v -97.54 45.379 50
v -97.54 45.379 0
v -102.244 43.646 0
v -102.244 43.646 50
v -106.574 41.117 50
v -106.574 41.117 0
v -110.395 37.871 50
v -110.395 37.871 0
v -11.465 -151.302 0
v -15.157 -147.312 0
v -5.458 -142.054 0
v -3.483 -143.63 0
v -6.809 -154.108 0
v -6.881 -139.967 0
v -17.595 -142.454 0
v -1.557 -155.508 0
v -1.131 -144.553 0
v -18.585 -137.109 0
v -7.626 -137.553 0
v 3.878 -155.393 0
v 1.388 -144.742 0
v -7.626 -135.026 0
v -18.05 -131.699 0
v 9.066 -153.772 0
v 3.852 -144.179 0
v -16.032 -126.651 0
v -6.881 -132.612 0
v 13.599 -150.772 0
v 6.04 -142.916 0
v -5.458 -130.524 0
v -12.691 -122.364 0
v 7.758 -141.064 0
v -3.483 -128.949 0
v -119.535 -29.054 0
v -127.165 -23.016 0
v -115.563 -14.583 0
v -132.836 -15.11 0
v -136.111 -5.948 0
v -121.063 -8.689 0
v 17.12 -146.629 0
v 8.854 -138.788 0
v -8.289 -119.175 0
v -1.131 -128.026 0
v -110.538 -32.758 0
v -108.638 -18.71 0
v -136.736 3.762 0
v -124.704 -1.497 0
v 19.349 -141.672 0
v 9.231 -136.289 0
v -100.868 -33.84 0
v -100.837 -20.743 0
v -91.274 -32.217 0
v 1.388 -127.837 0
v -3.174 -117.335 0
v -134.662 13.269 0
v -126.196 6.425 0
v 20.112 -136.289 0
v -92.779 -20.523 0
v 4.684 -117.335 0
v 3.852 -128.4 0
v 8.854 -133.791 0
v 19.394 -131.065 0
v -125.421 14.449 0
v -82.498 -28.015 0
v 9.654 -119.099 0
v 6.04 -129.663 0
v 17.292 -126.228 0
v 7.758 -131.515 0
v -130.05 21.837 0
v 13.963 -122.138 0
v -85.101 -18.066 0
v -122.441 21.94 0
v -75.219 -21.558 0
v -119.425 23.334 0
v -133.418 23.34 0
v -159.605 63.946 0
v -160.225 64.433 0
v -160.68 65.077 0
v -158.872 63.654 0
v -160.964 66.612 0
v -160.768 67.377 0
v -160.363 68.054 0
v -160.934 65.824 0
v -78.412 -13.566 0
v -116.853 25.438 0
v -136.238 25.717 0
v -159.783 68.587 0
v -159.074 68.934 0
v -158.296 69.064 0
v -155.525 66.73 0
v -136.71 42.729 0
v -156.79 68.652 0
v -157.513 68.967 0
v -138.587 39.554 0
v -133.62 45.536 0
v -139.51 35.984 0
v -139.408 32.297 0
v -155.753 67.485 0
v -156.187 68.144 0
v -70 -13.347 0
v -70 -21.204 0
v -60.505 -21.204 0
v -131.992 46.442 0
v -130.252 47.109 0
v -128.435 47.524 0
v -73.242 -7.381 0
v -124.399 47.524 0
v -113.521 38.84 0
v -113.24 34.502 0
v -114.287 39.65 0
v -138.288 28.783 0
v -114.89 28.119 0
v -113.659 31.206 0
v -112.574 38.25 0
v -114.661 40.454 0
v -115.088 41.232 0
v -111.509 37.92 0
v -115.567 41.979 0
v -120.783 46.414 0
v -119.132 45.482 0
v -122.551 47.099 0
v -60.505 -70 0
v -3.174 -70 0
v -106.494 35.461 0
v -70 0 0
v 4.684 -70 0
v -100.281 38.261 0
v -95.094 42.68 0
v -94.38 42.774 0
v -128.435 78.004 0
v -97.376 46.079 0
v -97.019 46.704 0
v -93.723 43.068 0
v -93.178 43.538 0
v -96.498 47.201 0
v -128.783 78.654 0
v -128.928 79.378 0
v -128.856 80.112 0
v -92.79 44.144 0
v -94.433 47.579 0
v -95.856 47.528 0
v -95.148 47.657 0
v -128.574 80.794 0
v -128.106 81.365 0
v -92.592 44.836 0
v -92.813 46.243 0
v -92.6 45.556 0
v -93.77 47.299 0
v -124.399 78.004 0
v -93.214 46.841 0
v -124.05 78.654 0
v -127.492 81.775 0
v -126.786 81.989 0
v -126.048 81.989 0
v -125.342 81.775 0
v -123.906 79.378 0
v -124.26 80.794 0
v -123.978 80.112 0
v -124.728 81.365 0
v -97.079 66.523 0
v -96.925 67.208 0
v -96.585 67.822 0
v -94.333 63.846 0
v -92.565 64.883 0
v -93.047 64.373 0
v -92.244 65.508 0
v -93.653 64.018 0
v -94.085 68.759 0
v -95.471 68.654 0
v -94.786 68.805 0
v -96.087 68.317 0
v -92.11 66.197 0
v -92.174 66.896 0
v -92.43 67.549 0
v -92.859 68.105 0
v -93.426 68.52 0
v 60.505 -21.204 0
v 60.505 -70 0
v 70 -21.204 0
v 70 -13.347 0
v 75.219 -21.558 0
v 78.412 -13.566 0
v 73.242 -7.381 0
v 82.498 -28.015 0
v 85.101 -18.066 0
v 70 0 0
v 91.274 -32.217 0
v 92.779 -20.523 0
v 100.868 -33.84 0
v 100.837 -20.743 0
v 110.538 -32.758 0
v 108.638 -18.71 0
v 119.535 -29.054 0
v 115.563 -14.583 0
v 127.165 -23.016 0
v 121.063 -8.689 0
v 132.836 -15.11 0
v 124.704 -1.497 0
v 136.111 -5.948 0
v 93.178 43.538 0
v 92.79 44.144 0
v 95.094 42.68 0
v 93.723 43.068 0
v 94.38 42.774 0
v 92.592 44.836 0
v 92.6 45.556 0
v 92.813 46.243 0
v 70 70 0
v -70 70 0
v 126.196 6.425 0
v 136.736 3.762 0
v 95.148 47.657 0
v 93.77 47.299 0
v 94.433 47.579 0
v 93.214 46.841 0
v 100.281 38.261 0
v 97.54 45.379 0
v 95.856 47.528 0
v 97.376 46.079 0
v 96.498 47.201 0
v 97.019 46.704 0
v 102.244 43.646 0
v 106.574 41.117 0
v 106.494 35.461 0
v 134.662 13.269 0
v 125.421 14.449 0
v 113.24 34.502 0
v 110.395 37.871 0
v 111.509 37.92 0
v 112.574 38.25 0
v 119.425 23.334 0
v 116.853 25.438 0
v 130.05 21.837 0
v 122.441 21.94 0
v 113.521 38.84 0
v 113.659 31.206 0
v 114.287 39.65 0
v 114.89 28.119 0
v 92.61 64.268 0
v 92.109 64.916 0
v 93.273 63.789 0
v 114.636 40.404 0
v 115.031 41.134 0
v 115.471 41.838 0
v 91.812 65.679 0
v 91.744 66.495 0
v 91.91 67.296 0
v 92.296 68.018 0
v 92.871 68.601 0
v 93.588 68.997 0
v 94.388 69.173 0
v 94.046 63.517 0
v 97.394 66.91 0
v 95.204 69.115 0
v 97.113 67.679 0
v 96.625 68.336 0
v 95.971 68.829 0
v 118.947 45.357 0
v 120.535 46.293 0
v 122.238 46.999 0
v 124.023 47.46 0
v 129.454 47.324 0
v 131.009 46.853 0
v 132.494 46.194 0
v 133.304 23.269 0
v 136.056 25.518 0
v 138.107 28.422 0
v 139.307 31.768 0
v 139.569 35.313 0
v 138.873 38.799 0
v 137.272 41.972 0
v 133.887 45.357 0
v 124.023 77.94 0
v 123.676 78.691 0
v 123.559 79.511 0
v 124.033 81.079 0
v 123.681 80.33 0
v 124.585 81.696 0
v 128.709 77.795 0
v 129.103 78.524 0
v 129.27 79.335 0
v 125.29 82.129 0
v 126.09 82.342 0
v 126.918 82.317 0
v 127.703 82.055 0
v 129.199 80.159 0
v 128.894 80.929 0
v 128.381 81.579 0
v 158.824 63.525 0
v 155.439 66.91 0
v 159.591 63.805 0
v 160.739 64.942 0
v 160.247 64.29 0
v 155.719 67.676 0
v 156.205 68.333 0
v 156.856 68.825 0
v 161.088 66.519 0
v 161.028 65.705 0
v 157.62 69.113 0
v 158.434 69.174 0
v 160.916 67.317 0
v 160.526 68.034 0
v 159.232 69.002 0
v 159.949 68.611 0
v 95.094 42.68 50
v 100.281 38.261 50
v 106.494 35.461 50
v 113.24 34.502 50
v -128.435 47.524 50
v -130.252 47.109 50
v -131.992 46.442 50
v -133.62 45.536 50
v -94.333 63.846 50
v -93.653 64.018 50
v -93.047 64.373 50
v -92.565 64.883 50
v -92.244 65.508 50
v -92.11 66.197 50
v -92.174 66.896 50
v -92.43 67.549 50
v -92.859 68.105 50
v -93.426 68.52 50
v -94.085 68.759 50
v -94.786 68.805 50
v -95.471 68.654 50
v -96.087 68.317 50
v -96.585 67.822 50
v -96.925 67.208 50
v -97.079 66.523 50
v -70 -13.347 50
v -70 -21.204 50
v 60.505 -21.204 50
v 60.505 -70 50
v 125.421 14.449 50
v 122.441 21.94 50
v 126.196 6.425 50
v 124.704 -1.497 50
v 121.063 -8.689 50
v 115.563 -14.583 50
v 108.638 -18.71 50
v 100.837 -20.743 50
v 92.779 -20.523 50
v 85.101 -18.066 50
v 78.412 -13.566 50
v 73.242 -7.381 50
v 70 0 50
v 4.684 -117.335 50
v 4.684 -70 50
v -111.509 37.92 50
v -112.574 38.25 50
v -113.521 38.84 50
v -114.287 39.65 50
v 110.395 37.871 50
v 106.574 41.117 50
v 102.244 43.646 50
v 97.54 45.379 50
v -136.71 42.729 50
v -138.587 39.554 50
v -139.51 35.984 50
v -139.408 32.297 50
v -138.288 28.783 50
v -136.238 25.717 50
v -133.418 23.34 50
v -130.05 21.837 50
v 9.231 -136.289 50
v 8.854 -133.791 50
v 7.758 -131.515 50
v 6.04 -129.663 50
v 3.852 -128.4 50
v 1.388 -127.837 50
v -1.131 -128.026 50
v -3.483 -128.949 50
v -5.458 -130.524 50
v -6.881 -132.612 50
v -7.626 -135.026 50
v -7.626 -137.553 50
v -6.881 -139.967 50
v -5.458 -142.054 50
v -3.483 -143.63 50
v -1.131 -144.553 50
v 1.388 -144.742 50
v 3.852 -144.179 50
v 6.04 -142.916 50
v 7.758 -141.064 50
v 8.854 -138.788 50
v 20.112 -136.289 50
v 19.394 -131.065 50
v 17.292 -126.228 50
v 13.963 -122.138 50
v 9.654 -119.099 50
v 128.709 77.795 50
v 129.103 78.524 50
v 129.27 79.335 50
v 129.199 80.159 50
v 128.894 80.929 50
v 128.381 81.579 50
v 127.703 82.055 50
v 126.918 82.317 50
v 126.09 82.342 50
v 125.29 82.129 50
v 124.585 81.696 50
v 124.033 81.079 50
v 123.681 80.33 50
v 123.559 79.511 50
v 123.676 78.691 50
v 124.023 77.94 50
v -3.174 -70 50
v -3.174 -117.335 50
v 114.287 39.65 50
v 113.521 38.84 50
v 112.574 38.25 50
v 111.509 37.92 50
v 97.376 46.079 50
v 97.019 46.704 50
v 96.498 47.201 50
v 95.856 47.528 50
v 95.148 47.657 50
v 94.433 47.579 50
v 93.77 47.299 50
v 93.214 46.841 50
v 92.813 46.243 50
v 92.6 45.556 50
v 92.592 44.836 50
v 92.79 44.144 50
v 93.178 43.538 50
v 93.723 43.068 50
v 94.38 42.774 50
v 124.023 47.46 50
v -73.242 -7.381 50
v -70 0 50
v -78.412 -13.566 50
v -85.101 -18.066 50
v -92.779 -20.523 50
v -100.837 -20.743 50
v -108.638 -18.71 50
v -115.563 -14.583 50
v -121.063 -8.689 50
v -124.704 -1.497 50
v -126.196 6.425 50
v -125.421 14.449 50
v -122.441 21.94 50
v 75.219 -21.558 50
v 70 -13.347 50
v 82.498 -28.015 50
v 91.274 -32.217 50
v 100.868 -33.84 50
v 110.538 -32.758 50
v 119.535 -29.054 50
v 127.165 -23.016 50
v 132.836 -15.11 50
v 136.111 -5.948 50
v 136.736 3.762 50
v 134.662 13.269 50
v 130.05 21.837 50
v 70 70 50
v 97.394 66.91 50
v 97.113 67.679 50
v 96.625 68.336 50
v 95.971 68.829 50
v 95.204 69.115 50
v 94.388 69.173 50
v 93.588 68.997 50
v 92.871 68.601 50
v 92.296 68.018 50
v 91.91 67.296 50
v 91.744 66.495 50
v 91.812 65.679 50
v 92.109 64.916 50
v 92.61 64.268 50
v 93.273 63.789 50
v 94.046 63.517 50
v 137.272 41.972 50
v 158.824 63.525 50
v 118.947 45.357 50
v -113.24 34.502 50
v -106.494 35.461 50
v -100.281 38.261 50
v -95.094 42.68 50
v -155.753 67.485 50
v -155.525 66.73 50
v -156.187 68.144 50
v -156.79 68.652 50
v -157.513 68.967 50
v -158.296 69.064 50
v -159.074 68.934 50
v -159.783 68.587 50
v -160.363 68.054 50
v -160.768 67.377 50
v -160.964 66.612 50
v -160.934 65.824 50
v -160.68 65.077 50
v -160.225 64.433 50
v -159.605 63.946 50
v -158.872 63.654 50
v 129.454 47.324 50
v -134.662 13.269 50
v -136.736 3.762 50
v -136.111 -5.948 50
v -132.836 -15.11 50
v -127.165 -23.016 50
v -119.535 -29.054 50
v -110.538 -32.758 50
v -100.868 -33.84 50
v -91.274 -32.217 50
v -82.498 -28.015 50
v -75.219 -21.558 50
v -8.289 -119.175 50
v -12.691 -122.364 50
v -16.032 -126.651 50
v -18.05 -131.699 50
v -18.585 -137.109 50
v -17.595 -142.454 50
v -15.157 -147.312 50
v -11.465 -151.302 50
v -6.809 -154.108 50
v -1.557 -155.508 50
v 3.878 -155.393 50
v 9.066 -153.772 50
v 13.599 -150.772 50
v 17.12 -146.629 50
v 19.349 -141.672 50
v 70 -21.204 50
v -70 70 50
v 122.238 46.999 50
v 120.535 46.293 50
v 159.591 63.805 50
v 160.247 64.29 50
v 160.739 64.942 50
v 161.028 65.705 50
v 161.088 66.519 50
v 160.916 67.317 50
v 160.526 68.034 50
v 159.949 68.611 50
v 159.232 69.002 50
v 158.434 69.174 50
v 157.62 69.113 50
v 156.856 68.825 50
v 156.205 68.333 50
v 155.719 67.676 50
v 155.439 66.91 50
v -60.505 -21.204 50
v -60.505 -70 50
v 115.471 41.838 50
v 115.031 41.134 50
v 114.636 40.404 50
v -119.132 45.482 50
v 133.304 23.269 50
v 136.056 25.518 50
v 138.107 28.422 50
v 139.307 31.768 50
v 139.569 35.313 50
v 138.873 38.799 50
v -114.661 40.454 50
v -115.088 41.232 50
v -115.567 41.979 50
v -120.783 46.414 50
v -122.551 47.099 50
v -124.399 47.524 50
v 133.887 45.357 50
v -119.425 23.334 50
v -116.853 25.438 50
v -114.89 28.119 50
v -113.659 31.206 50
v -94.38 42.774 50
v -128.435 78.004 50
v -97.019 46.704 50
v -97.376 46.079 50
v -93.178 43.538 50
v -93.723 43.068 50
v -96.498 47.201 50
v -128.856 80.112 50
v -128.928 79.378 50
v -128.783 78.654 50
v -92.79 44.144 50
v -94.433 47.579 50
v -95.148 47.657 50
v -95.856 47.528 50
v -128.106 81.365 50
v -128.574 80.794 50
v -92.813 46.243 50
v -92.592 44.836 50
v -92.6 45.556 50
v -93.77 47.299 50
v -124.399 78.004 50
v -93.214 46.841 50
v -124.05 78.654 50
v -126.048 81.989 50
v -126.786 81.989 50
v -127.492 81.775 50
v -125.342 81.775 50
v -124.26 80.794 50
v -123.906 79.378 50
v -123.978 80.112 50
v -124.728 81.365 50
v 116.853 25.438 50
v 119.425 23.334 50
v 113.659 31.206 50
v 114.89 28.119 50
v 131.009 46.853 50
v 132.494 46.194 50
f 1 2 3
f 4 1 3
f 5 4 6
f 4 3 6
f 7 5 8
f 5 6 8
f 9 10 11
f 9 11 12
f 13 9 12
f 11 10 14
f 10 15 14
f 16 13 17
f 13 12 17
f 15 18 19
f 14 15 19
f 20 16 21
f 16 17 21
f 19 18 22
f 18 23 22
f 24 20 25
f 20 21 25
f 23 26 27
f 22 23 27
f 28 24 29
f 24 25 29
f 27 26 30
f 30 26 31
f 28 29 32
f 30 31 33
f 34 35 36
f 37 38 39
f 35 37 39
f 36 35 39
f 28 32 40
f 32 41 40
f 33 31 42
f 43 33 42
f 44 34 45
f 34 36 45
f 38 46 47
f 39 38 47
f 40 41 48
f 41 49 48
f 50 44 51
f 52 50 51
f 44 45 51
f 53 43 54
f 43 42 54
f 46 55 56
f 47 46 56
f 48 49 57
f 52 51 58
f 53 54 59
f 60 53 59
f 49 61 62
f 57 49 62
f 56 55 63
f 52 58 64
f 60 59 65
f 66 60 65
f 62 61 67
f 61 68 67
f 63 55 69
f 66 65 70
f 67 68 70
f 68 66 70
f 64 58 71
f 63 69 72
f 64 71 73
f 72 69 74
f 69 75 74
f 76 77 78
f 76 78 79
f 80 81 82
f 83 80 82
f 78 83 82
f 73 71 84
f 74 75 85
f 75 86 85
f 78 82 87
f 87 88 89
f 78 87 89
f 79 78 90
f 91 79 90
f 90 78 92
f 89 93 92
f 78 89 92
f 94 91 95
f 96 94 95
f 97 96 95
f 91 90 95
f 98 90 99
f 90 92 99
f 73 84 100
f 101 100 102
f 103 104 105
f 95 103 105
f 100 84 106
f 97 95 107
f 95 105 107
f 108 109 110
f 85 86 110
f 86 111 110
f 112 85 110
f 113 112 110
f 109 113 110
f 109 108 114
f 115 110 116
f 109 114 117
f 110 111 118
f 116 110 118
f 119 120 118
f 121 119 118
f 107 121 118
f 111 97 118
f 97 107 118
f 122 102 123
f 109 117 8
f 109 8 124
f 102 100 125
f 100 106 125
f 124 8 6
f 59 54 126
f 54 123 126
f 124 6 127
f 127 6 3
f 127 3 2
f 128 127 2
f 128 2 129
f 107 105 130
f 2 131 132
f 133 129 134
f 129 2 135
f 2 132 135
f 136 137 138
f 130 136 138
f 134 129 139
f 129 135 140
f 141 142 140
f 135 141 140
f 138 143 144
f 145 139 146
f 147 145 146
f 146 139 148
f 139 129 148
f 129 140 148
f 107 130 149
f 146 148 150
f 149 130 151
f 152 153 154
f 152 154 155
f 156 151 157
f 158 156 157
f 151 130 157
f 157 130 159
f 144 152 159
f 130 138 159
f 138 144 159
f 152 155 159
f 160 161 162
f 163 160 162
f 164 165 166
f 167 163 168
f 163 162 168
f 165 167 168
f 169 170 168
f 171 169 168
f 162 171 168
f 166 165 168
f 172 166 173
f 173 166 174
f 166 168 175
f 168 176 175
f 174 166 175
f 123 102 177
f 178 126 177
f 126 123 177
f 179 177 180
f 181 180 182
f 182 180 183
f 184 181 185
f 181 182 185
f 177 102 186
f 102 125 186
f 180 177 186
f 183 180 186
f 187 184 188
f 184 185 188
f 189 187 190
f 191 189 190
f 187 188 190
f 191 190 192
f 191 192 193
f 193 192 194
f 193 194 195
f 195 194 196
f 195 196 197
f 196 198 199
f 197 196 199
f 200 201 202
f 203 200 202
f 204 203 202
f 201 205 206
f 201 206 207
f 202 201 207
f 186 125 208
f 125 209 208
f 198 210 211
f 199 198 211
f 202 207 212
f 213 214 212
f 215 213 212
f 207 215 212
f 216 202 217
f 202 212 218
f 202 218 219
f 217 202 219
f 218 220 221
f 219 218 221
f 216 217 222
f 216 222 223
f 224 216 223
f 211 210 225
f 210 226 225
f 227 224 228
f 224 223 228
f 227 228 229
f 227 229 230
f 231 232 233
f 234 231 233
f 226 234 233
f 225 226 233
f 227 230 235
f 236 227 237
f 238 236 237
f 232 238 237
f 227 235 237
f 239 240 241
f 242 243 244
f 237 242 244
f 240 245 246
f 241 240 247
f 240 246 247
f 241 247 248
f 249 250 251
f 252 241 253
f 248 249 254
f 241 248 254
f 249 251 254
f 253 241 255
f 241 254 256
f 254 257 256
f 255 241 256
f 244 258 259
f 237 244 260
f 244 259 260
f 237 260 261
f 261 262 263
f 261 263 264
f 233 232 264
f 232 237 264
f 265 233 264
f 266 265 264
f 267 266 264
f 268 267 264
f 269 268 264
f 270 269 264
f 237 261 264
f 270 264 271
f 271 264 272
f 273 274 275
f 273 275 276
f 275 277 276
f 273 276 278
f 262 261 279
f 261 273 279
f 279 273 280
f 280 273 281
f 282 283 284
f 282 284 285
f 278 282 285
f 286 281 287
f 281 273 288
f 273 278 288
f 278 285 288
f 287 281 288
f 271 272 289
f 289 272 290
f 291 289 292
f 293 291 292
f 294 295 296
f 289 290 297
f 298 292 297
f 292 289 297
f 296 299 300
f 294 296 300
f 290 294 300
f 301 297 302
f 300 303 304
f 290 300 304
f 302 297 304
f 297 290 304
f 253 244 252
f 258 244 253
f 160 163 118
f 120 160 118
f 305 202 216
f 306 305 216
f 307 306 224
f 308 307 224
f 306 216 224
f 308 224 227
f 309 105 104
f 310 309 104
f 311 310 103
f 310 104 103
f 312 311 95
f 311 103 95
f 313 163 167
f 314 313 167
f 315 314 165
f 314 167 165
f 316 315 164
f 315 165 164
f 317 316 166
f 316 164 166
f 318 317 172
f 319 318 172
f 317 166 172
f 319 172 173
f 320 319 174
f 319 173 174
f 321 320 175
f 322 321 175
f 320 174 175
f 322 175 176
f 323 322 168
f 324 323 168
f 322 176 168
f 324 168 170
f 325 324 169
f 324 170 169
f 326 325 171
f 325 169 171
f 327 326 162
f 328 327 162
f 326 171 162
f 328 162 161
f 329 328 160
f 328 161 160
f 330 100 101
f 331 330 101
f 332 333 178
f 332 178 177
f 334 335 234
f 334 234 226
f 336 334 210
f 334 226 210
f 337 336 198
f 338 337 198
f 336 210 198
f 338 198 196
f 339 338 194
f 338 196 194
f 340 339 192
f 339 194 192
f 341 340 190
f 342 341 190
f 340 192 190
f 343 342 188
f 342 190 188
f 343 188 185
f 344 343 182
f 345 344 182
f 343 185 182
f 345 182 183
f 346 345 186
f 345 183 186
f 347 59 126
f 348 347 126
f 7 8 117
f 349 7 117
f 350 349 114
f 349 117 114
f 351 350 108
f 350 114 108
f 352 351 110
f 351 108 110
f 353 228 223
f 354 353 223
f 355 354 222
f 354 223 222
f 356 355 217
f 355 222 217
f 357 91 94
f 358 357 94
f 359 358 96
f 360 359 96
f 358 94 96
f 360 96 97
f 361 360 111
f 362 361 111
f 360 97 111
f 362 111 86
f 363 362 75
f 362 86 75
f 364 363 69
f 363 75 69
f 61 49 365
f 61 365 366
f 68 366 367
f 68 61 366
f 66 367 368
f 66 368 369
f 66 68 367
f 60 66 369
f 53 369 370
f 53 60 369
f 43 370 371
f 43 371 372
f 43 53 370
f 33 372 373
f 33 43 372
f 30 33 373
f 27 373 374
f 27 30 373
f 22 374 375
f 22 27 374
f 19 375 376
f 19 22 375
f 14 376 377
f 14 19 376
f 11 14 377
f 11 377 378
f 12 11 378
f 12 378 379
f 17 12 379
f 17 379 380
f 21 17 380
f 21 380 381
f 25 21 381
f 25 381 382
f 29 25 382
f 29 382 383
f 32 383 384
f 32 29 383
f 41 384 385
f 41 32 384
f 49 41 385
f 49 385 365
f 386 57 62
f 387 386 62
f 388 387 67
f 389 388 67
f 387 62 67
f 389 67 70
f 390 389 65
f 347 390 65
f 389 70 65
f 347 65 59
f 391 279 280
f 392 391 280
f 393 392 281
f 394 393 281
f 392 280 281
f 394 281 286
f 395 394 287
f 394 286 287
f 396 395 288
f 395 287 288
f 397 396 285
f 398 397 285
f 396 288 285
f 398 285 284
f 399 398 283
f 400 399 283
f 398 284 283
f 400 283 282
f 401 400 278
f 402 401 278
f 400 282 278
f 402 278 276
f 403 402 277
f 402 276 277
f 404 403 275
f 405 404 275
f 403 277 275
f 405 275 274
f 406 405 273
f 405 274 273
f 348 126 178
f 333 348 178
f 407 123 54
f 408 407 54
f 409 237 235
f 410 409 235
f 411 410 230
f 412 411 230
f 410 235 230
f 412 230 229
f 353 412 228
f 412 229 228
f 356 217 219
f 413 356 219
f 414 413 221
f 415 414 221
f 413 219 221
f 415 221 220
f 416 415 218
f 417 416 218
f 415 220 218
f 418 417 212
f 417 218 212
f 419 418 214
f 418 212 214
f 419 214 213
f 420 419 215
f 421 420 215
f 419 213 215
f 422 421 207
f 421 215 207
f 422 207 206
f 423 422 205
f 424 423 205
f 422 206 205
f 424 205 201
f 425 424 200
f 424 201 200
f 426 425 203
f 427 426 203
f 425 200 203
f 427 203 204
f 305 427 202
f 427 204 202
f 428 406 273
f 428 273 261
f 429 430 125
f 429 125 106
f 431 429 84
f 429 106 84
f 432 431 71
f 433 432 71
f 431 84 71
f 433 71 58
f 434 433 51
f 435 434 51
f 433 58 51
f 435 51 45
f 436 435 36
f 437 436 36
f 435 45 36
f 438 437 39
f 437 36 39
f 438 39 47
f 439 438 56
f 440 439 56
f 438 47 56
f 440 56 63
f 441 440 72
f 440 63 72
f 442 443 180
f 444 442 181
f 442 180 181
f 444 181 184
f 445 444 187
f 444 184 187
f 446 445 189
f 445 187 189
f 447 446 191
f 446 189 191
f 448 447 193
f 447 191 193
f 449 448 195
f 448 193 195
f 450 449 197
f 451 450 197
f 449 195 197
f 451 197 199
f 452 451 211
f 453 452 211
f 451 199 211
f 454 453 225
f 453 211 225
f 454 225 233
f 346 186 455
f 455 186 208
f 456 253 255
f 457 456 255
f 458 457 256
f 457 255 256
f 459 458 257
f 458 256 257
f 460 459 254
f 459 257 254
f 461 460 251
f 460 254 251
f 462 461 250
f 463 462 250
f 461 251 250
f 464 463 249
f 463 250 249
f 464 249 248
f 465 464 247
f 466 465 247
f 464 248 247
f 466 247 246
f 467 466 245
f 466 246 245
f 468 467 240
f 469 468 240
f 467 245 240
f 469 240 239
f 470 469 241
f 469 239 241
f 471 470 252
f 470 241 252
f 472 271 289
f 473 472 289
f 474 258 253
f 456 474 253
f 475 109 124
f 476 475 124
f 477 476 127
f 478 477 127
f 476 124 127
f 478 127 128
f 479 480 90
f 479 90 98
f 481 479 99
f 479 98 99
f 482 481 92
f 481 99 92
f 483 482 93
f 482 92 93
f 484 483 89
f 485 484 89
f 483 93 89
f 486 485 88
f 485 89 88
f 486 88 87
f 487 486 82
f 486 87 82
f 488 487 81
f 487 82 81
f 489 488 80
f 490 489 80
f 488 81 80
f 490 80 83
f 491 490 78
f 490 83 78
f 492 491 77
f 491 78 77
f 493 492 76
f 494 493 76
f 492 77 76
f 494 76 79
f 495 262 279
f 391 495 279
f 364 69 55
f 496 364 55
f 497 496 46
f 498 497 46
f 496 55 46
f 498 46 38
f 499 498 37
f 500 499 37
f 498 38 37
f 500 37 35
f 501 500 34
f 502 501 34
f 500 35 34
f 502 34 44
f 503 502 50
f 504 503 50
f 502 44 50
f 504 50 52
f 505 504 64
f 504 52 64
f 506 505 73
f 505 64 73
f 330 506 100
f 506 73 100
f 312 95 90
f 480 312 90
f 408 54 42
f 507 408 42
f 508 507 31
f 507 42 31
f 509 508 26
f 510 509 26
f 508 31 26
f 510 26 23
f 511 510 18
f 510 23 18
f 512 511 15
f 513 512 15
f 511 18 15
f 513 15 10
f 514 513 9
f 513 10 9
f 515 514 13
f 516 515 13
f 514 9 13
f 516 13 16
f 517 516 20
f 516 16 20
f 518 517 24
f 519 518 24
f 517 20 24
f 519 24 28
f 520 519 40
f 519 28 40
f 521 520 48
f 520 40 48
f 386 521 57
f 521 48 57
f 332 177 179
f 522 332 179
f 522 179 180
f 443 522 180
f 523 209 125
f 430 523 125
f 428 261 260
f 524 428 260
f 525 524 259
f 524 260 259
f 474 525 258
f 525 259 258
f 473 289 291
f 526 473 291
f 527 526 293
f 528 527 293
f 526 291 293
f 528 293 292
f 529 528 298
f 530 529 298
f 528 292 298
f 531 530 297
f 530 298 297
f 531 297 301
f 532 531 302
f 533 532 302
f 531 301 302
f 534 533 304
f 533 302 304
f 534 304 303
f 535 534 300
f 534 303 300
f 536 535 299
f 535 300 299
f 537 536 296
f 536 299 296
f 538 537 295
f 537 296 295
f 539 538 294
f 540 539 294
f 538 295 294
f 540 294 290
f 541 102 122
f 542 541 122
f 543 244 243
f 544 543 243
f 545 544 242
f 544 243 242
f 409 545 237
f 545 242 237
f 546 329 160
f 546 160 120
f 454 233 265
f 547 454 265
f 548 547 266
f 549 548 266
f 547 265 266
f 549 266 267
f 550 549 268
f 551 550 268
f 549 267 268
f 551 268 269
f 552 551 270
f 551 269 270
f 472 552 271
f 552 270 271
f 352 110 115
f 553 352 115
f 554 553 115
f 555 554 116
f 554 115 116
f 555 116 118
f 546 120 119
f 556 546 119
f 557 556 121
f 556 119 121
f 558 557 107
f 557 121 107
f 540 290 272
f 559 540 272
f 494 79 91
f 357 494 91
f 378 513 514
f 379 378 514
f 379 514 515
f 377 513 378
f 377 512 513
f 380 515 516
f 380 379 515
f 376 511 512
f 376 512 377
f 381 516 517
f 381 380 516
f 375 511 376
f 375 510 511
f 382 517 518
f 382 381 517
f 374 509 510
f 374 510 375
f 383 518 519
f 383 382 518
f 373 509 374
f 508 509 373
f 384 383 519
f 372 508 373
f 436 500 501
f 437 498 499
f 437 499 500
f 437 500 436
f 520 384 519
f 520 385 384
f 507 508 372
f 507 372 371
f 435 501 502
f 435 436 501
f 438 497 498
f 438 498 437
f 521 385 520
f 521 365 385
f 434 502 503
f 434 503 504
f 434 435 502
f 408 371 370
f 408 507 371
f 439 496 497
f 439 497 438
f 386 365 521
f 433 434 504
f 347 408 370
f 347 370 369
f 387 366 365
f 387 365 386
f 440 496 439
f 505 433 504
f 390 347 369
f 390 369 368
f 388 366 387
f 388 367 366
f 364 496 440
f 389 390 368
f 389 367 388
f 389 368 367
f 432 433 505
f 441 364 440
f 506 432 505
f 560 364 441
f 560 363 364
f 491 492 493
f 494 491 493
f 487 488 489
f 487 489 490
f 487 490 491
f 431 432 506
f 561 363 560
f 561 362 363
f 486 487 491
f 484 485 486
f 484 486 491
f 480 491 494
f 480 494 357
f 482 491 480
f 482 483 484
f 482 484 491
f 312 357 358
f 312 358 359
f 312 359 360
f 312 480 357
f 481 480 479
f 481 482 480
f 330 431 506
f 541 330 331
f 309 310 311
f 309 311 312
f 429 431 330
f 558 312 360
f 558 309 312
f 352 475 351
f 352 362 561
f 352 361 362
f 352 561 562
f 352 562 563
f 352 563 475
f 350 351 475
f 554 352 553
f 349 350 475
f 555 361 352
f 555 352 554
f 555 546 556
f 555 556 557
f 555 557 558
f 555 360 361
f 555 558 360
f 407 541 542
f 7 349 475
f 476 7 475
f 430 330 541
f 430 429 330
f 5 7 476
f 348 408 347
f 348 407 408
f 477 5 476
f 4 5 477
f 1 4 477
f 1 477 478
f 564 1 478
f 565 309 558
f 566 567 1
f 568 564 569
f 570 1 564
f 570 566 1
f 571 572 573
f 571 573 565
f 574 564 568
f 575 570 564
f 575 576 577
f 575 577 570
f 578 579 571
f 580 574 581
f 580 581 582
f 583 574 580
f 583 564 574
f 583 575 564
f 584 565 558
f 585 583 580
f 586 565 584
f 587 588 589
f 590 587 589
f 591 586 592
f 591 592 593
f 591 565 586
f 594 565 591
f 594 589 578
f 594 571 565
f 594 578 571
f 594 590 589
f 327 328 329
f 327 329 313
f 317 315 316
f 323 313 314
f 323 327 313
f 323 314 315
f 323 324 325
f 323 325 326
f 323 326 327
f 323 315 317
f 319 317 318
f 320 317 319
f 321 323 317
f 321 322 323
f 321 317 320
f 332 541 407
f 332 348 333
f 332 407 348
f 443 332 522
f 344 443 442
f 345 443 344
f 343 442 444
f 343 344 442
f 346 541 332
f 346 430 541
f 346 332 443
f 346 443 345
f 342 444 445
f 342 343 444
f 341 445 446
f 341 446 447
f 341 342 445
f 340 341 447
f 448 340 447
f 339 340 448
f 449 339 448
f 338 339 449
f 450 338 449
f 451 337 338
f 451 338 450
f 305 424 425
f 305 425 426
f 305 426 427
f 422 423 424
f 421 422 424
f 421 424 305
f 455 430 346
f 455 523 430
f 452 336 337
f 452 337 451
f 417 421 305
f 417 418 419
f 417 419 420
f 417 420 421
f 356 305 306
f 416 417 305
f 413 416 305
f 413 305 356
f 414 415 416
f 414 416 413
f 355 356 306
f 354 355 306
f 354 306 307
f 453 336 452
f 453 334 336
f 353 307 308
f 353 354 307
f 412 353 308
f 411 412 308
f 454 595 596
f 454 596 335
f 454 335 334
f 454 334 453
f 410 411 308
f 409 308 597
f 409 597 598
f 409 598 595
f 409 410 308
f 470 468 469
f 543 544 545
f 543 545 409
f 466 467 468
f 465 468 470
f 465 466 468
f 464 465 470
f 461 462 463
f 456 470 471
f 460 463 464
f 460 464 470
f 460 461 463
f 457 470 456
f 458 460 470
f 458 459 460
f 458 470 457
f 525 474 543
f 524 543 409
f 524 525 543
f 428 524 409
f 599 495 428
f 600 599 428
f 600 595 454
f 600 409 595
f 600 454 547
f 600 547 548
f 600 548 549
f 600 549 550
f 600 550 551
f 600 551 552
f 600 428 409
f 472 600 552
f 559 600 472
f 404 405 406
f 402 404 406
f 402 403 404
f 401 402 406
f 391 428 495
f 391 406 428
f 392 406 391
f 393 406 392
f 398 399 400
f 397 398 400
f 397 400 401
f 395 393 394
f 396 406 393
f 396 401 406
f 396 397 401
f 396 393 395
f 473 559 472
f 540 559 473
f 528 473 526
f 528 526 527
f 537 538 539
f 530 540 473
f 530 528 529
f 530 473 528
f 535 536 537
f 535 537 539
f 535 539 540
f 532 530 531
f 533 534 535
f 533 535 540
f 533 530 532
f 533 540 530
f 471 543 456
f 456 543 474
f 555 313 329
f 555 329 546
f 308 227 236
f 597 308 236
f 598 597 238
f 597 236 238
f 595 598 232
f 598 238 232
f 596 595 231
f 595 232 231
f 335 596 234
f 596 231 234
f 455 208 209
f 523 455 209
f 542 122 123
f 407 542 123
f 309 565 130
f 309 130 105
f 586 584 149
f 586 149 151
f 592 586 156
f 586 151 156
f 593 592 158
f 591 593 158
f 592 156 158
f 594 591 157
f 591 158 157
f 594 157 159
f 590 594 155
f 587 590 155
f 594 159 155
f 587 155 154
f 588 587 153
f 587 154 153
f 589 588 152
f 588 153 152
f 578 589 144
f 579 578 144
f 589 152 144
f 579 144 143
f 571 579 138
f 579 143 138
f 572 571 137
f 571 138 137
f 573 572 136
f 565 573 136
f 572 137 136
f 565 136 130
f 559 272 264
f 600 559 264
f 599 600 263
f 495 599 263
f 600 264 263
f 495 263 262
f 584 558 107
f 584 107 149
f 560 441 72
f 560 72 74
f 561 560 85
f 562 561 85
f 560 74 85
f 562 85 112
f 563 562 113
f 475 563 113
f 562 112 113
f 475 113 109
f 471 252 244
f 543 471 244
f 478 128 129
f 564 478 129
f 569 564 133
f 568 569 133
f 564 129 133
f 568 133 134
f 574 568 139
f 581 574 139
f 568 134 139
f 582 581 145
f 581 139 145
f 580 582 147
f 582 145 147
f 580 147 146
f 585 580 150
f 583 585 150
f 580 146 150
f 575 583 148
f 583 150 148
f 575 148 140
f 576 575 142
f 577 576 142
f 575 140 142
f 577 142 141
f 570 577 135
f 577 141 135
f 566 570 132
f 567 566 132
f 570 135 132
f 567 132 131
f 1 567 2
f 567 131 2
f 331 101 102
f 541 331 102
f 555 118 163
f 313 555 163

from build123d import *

# Parameters (mm, degrees)
F0_W     = 8.2024587318
F0_H     = 14.9754456007
F0_W_2   = 7.8511701431
F0_W_3   = 6.1057833955
F0_W_4   = 7.9714395106
F0_W_5   = 7.8018347267
F0_R     = 8.4758171695
F0_W_6   = 12.1613740921
F0_H_2   = 5.3091626614
F0_W_7   = 15.6213007867
F0_H_3   = 4.9807038158
F0_W_8   = 18.6961237341
F0_H_4   = 5.3202975541
F0_H_5   = 5.4446328431
F0_H_6   = 5.7703666389
F0_W_9   = 15.5081027187
F0_H_7   = 5.2070990205
F0_H_8   = 4.8675052822
F0_H_9   = 5.4084993899
F1_DEPTH = 50


with BuildPart() as f1:
    # F0 (on Top) → F1 (new body)
    with BuildSketch(Plane.XY):
        with BuildLine():
            ThreePointArc((-130.0504121954, 21.8366431133), (-119.5351660381, -29.0544007963), (-70, -13.3465658873))
            Line((-70, -13.3465658873), (-70, 0))
            ThreePointArc((-70, 0), (-108.6376082105, -18.7095534221), (-122.4410153952, 21.939900542))
            ThreePointArc((-122.4410153952, 21.939900542), (-115.7864607632, 26.7166574775), (-113.2402649142, 34.5023745845))
            ThreePointArc((-113.2402649142, 34.5023745845), (-113.504682577, 37.1288446093), (-114.2873233284, 39.649902908))
            ThreePointArc((-114.2873233284, 39.649902908), (-114.8682389509, 40.8468278409), (-115.5668931987, 41.9790709674))
            ThreePointArc((-115.5668931987, 41.9790709674), (-117.1816492611, 43.9009770114), (-119.131571718, 45.4817876878))
            ThreePointArc((-119.131571718, 45.4817876878), (-121.6544110929, 46.7882256944), (-124.398651027, 47.5235120068))
            ThreePointArc((-124.398651027, 47.5235120068), (-126.416883712, 47.6789933823), (-128.435116397, 47.5235120068))
            ThreePointArc((-128.435116397, 47.5235120068), (-131.1335313279, 46.8058910822), (-133.6201487451, 45.5357900033))
            ThreePointArc((-133.6201487451, 45.5357900033), (-135.2768725539, 44.2555218029), (-136.7098901894, 42.7289960416))
            ThreePointArc((-136.7098901894, 42.7289960416), (-138.9711537713, 30.5006766677), (-130.0504121954, 21.8366431133))
        make_face()
        Polygon((-60.5054162443, -21.2038177997), (-60.5054162443, -70), (-3.1736695673, -70), (4.6835821122, -70), (60.5054162443, -70), (60.5054162443, -21.2038177997), (70, -21.2038177997), (70, -13.3465658873), (70, 0), (70, 70), (-70, 70), (-70, 0), (-70, -13.3465658873), (-70, -21.2038177997), align=None)
        with BuildLine():
            ThreePointArc((-43.5259640217, -35.8406656981), (-42.5875064789, -55.7965331861), (-45.3945958096, -36.01680621))
            Line((-45.3945958096, -36.01680621), (-43.5259640217, -45.8406656981))
            Line((-43.5259640217, -45.8406656981), (-43.5259640217, -35.8406656981))
        make_face(mode=Mode.SUBTRACT)
        with BuildLine():
            ThreePointArc((-23.7259689531, -44.2763551831), (-3.9628669783, -47.186751296), (-23.9153972382, -46.2135393839))
            Line((-23.9153972382, -46.2135393839), (-13.9153972382, -46.2135393839))
            Line((-13.9153972382, -46.2135393839), (-23.7259689531, -44.2763551831))
        make_face(mode=Mode.SUBTRACT)
        with BuildLine():
            ThreePointArc((19.5891654442, -54.8887500712), (9.3177240714, -37.773142046), (21.6384869115, -53.4780886866))
            Line((21.6384869115, -53.4780886866), (14.9877956137, -46.0102707148))
            Line((14.9877956137, -46.0102707148), (19.5891654442, -54.8887500712))
        make_face(mode=Mode.SUBTRACT)
        with BuildLine():
            ThreePointArc((54.2939669435, -47.4309626042), (34.5934502284, -44.1615858906), (54.5334093753, -45.2557577961))
            Line((54.5334093753, -45.2557577961), (44.5334093753, -45.2557577961))
            Line((44.5334093753, -45.2557577961), (54.2939669435, -47.4309626042))
        make_face(mode=Mode.SUBTRACT)
        Polygon((-29.1168112308, 17.9860703647), (-47.8129349649, 17.9860703647), (-47.8129349649, 23.3945697546), (-47.8129349649, 28.7148673087), (-47.8129349649, 33.6955711246), (-47.8129349649, 39.1402039677), (-47.8129349649, 44.4493666291), (-47.8129349649, 49.6564656496), (-47.8129349649, 54.5239709318), (-47.8129349649, 60.2943375707), (-29.1168112308, 60.2943375707), (-10.7625117525, 60.2943375707), (4.5221573673, 60.2943375707), (20.0302600861, 60.2943375707), (35.6515608728, 60.2943375707), (47.8129349649, 60.2943375707), (47.8129349649, 54.5239709318), (47.8129349649, 49.6564656496), (47.8129349649, 44.4493666291), (47.8129349649, 39.1402039677), (47.8129349649, 33.6955711246), (47.8129349649, 28.7148673087), (47.8129349649, 23.3945697546), (47.8129349649, 17.9860703647), (35.6515608728, 17.9860703647), (20.0302600861, 17.9860703647), (4.5221573673, 17.9860703647), (-10.3591205552, 17.9860703647), align=None, mode=Mode.SUBTRACT)
        Polygon((-10.1461857557, -13.2323872645), (-18.1176252663, -13.2323872645), (-18.1176252663, 1.7430583362), (-10.1461857557, 1.7430583362), (-4.0404023603, 1.7430583362), (3.7614323664, 1.7430583362), (11.6126025096, 1.7430583362), (19.8150612414, 1.7430583362), (19.8150612414, -13.2323872645), (11.6126025096, -13.2323872645), (3.7614323664, -13.2323872645), (-4.0404023603, -13.2323872645), align=None, mode=Mode.SUBTRACT)
        with BuildLine():
            Line((70, 0), (70, -13.3465658873))
            ThreePointArc((70, -13.3465658873), (119.5351660381, -29.0544007963), (130.0504121954, 21.8366431133))
            ThreePointArc((130.0504121954, 21.8366431133), (138.8200130193, 30.0542664106), (137.2715918614, 41.9722202276))
            ThreePointArc((137.2715918614, 41.9722202276), (135.734160217, 43.8196510895), (133.8867293551, 45.3570827339))
            ThreePointArc((133.8867293551, 45.3570827339), (131.7614666088, 46.5464069906), (129.4536248278, 47.3242888853))
            ThreePointArc((129.4536248278, 47.3242888853), (126.7455827995, 47.674892941), (124.0234244804, 47.4597908334))
            ThreePointArc((124.0234244804, 47.4597908334), (121.3744087449, 46.6759824781), (118.9470358244, 45.3570811894))
            ThreePointArc((118.9470358244, 45.3570811894), (117.0424209259, 43.7621116442), (115.4710238, 41.8380022828))
            ThreePointArc((115.4710238, 41.8380022828), (114.8274186608, 40.7719505485), (114.2873233284, 39.649902908))
            ThreePointArc((114.2873233284, 39.649902908), (113.504682577, 37.1288446093), (113.2402649142, 34.5023745845))
            ThreePointArc((113.2402649142, 34.5023745845), (115.7864607632, 26.7166574775), (122.4410153952, 21.939900542))
            ThreePointArc((122.4410153952, 21.939900542), (108.6376082105, -18.7095534221), (70, 0))
        make_face()
        with BuildLine():
            ThreePointArc((95.0937389393, 42.679719094), (103.288313244, 36.6411293585), (113.2402649142, 34.5023745845))
            ThreePointArc((113.2402649142, 34.5023745845), (113.504682577, 37.1288446093), (114.2873233284, 39.649902908))
            ThreePointArc((114.2873233284, 39.649902908), (112.5739963411, 38.250429476), (110.3945353679, 37.8710021204))
            ThreePointArc((110.3945353679, 37.8710021204), (104.4646528089, 42.4765419774), (97.539836383, 45.3785106205))
            ThreePointArc((97.539836383, 45.3785106205), (93.2143177046, 46.8410933875), (95.0937389393, 42.679719094))
        make_face()
        with BuildLine():
            Line((94.0459784419, 63.5174356565), (115.4710238, 41.8380022828))
            ThreePointArc((115.4710238, 41.8380022828), (117.0424209259, 43.7621116442), (118.9470358244, 45.3570811894))
            Line((118.9470358244, 45.3570811894), (97.3944211338, 66.9096958799))
            ThreePointArc((97.3944211338, 66.9096958799), (92.5628075217, 68.330174272), (94.0459784419, 63.5174356565))
        make_face()
        with BuildLine():
            ThreePointArc((124.0234244804, 47.4597908334), (126.7455827995, 47.674892941), (129.4536248278, 47.3242888853))
            Line((129.4536248278, 47.3242888853), (128.7094544186, 77.7952030561))
            ThreePointArc((128.7094544186, 77.7952030561), (126.5050371575, 82.3593912177), (124.0234244804, 77.9397908334))
            Line((124.0234244804, 77.9397908334), (124.0234244804, 47.4597908334))
        make_face()
        with BuildLine():
            ThreePointArc((133.8867293551, 45.3570827339), (135.734160217, 43.8196510895), (137.2715918614, 41.9722202276))
            Line((137.2715918614, 41.9722202276), (158.824206552, 63.5248349182))
            ThreePointArc((158.824206552, 63.5248349182), (160.2578661303, 68.3433570028), (155.4393440457, 66.9096974245))
            Line((155.4393440457, 66.9096974245), (133.8867293551, 45.3570827339))
        make_face()
        with BuildLine():
            Line((-158.8719812907, 63.6543901362), (-136.7098901894, 42.7289960416))
            ThreePointArc((-136.7098901894, 42.7289960416), (-135.2768725539, 44.2555218029), (-133.6201487451, 45.5357900033))
            Line((-133.6201487451, 45.5357900033), (-155.5248616789, 66.7304579953))
            ThreePointArc((-155.5248616789, 66.7304579953), (-160.0923686659, 68.3413751972), (-158.8719812907, 63.6543901362))
        make_face()
        with BuildLine():
            Line((-128.435116397, 78.0035120068), (-128.435116397, 47.5235120068))
            ThreePointArc((-128.435116397, 47.5235120068), (-126.416883712, 47.6789933823), (-124.398651027, 47.5235120068))
            Line((-124.398651027, 47.5235120068), (-124.398651027, 78.0035120068))
            ThreePointArc((-124.398651027, 78.0035120068), (-126.416883712, 82.016306206), (-128.435116397, 78.0035120068))
        make_face()
        with BuildLine():
            ThreePointArc((-119.131571718, 45.4817876878), (-117.1816492611, 43.9009770114), (-115.5668931987, 41.9790709674))
            Line((-115.5668931987, 41.9790709674), (-94.333186417, 63.8459430874))
            ThreePointArc((-94.333186417, 63.8459430874), (-92.8588034867, 68.1053754047), (-97.0792408983, 66.5228215363))
            Line((-97.0792408983, 66.5228215363), (-119.131571718, 45.4817876878))
        make_face()
        with BuildLine():
            ThreePointArc((-114.2873233284, 39.649902908), (-113.504682577, 37.1288446093), (-113.2402649142, 34.5023745845))
            ThreePointArc((-113.2402649142, 34.5023745845), (-103.288313244, 36.6411293585), (-95.0937389393, 42.679719094))
            ThreePointArc((-95.0937389393, 42.679719094), (-93.2143177046, 46.8410933875), (-97.539836383, 45.3785106205))
            ThreePointArc((-97.539836383, 45.3785106205), (-104.4646528089, 42.4765419774), (-110.3945353679, 37.8710021204))
            ThreePointArc((-110.3945353679, 37.8710021204), (-112.5739963411, 38.250429476), (-114.2873233284, 39.649902908))
        make_face()
        with BuildLine():
            Line((-43.5259640217, -45.8406656981), (-45.3945958096, -36.01680621))
            ThreePointArc((-45.3945958096, -36.01680621), (-42.5875064789, -55.7965331861), (-43.5259640217, -35.8406656981))
            Line((-43.5259640217, -35.8406656981), (-43.5259640217, -45.8406656981))
        make_face()
        with BuildLine():
            Line((-13.9153972382, -46.2135393839), (-23.9153972382, -46.2135393839))
            ThreePointArc((-23.9153972382, -46.2135393839), (-3.9628669783, -47.186751296), (-23.7259689531, -44.2763551831))
            Line((-23.7259689531, -44.2763551831), (-13.9153972382, -46.2135393839))
        make_face()
        with BuildLine():
            Line((14.9877956137, -46.0102707148), (21.6384869115, -53.4780886866))
            ThreePointArc((21.6384869115, -53.4780886866), (9.3177240714, -37.773142046), (19.5891654442, -54.8887500712))
            Line((19.5891654442, -54.8887500712), (14.9877956137, -46.0102707148))
        make_face()
        with BuildLine():
            Line((44.5334093753, -45.2557577961), (54.5334093753, -45.2557577961))
            ThreePointArc((54.5334093753, -45.2557577961), (34.5934502284, -44.1615858906), (54.2939669435, -47.4309626042))
            Line((54.2939669435, -47.4309626042), (44.5334093753, -45.2557577961))
        make_face()
        with Locations((15.7138318755, -5.7446644641)):
            Rectangle(F0_W, F0_H)
        with Locations((7.687017438, -5.7446644641)):
            Rectangle(F0_W_2, F0_H)
        with Locations((-7.093294058, -5.7446644641)):
            Rectangle(F0_W_3, F0_H)
        with Locations((-14.131905511, -5.7446644641)):
            Rectangle(F0_W_4, F0_H)
        with Locations((-0.1394849969, -5.7446644641)):
            Rectangle(F0_W_5, F0_H)
        with BuildLine():
            Line((4.6835821122, -70), (-3.1736695673, -70))
            Line((-3.1736695673, -70), (-3.1736695673, -117.3349233655))
            ThreePointArc((-3.1736695673, -117.3349233655), (0.7549562724, -116.9320700406), (4.6835821122, -117.3349233655))
            Line((4.6835821122, -117.3349233655), (4.6835821122, -70))
        make_face()
        with BuildLine():
            ThreePointArc((4.6835821122, -117.3349233655), (0.7549562724, -116.9320700406), (-3.1736695673, -117.3349233655))
            ThreePointArc((-3.1736695673, -117.3349233655), (-11.4651338896, -151.3020925139), (20.1123635802, -136.2894773483))
            ThreePointArc((20.1123635802, -136.2894773483), (15.767571438, -124.0693871863), (4.6835821122, -117.3349233655))
        make_face()
        with Locations((0.7549562724, -136.2894773483)):
            Circle(F0_R, mode=Mode.SUBTRACT)
        with Locations((41.7322479188, 41.7947852984)):
            Rectangle(F0_W_6, F0_H_2)
        with Locations((27.8409104794, 31.2052192166)):
            Rectangle(F0_W_7, F0_H_3)
        with Locations((-38.4648730978, 26.0547185317)):
            Rectangle(F0_W_8, F0_H_4)
        Polygon((-10.5089039129, 33.6955711246), (-10.4614150364, 28.7148673087), (4.5221573673, 28.7148673087), (4.5221573673, 33.6955711246), align=None)
        with Locations((27.8409104794, 36.4178875461)):
            Rectangle(F0_W_7, F0_H_5)
        with Locations((27.8409104794, 57.4091542512)):
            Rectangle(F0_W_7, F0_H_6)
        Polygon((-29.1168112308, 33.6955711246), (-29.1168112308, 28.7148673087), (-10.4614150364, 28.7148673087), (-10.5089039129, 33.6955711246), align=None)
        with Locations((41.7322479188, 26.0547185317)):
            Rectangle(F0_W_6, F0_H_4)
        Polygon((-10.4106882792, 23.3945697546), (-10.3591205552, 17.9860703647), (4.5221573673, 17.9860703647), (4.5221573673, 23.3945697546), align=None)
        Polygon((-29.1168112308, 23.3945697546), (-29.1168112308, 17.9860703647), (-10.3591205552, 17.9860703647), (-10.4106882792, 23.3945697546), align=None)
        Polygon((-29.1168112308, 60.2943375707), (-29.1168112308, 54.5239709318), (-10.7074937794, 54.5239709318), (-10.7625117525, 60.2943375707), align=None)
        Polygon((-29.1168112308, 54.5239709318), (-29.1168112308, 49.6564656496), (-10.6610842025, 49.6564656496), (-10.7074937794, 54.5239709318), align=None)
        with Locations((12.2762087267, 31.2052192166)):
            Rectangle(F0_W_9, F0_H_3)
        with Locations((27.8409104794, 41.7947852984)):
            Rectangle(F0_W_7, F0_H_2)
        Polygon((-29.1168112308, 39.1402039677), (-29.1168112308, 33.6955711246), (-10.5089039129, 33.6955711246), (-10.5608161539, 39.1402039677), align=None)
        with Locations((12.2762087267, 47.0529161394)):
            Rectangle(F0_W_9, F0_H_7)
        with Locations((41.7322479188, 31.2052192166)):
            Rectangle(F0_W_6, F0_H_3)
        with Locations((-38.4648730978, 31.2052192166)):
            Rectangle(F0_W_8, F0_H_3)
        Polygon((-10.7074937794, 54.5239709318), (-10.6610842025, 49.6564656496), (4.5221573673, 49.6564656496), (4.5221573673, 54.5239709318), align=None)
        with Locations((12.2762087267, 52.0902182907)):
            Rectangle(F0_W_9, F0_H_8)
        with Locations((-38.4648730978, 36.4178875461)):
            Rectangle(F0_W_8, F0_H_5)
        with Locations((27.8409104794, 47.0529161394)):
            Rectangle(F0_W_7, F0_H_7)
        Polygon((-29.1168112308, 28.7148673087), (-29.1168112308, 23.3945697546), (-10.4106882792, 23.3945697546), (-10.4614150364, 28.7148673087), align=None)
        with Locations((41.7322479188, 36.4178875461)):
            Rectangle(F0_W_6, F0_H_5)
        with Locations((41.7322479188, 20.6903200597)):
            Rectangle(F0_W_6, F0_H_9)
        Polygon((-10.4614150364, 28.7148673087), (-10.4106882792, 23.3945697546), (4.5221573673, 23.3945697546), (4.5221573673, 28.7148673087), align=None)
        with Locations((-38.4648730978, 20.6903200597)):
            Rectangle(F0_W_8, F0_H_9)
        Polygon((-10.7625117525, 60.2943375707), (-10.7074937794, 54.5239709318), (4.5221573673, 54.5239709318), (4.5221573673, 60.2943375707), align=None)
        with Locations((41.7322479188, 47.0529161394)):
            Rectangle(F0_W_6, F0_H_7)
        with Locations((12.2762087267, 20.6903200597)):
            Rectangle(F0_W_9, F0_H_9)
        with Locations((41.7322479188, 52.0902182907)):
            Rectangle(F0_W_6, F0_H_8)
        with Locations((27.8409104794, 20.6903200597)):
            Rectangle(F0_W_7, F0_H_9)
        with Locations((27.8409104794, 52.0902182907)):
            Rectangle(F0_W_7, F0_H_8)
        with Locations((-38.4648730978, 41.7947852984)):
            Rectangle(F0_W_8, F0_H_2)
        with Locations((41.7322479188, 57.4091542512)):
            Rectangle(F0_W_6, F0_H_6)
        with Locations((12.2762087267, 57.4091542512)):
            Rectangle(F0_W_9, F0_H_6)
        with Locations((12.2762087267, 26.0547185317)):
            Rectangle(F0_W_9, F0_H_4)
        with Locations((-38.4648730978, 57.4091542512)):
            Rectangle(F0_W_8, F0_H_6)
        Polygon((-29.1168112308, 49.6564656496), (-29.1168112308, 44.4493666291), (-10.6114367447, 44.4493666291), (-10.6610842025, 49.6564656496), align=None)
        Polygon((-10.6610842025, 49.6564656496), (-10.6114367447, 44.4493666291), (4.5221573673, 44.4493666291), (4.5221573673, 49.6564656496), align=None)
        Polygon((-10.6114367447, 44.4493666291), (-10.5608161539, 39.1402039677), (4.5221573673, 39.1402039677), (4.5221573673, 44.4493666291), align=None)
        with Locations((-38.4648730978, 52.0902182907)):
            Rectangle(F0_W_8, F0_H_8)
        with Locations((12.2762087267, 41.7947852984)):
            Rectangle(F0_W_9, F0_H_2)
        Polygon((-10.5608161539, 39.1402039677), (-10.5089039129, 33.6955711246), (4.5221573673, 33.6955711246), (4.5221573673, 39.1402039677), align=None)
        Polygon((-29.1168112308, 44.4493666291), (-29.1168112308, 39.1402039677), (-10.5608161539, 39.1402039677), (-10.6114367447, 44.4493666291), align=None)
        with Locations((27.8409104794, 26.0547185317)):
            Rectangle(F0_W_7, F0_H_4)
        with Locations((12.2762087267, 36.4178875461)):
            Rectangle(F0_W_9, F0_H_5)
        with Locations((-38.4648730978, 47.0529161394)):
            Rectangle(F0_W_8, F0_H_7)
    extrude(amount=F1_DEPTH)


solid = f1.part
